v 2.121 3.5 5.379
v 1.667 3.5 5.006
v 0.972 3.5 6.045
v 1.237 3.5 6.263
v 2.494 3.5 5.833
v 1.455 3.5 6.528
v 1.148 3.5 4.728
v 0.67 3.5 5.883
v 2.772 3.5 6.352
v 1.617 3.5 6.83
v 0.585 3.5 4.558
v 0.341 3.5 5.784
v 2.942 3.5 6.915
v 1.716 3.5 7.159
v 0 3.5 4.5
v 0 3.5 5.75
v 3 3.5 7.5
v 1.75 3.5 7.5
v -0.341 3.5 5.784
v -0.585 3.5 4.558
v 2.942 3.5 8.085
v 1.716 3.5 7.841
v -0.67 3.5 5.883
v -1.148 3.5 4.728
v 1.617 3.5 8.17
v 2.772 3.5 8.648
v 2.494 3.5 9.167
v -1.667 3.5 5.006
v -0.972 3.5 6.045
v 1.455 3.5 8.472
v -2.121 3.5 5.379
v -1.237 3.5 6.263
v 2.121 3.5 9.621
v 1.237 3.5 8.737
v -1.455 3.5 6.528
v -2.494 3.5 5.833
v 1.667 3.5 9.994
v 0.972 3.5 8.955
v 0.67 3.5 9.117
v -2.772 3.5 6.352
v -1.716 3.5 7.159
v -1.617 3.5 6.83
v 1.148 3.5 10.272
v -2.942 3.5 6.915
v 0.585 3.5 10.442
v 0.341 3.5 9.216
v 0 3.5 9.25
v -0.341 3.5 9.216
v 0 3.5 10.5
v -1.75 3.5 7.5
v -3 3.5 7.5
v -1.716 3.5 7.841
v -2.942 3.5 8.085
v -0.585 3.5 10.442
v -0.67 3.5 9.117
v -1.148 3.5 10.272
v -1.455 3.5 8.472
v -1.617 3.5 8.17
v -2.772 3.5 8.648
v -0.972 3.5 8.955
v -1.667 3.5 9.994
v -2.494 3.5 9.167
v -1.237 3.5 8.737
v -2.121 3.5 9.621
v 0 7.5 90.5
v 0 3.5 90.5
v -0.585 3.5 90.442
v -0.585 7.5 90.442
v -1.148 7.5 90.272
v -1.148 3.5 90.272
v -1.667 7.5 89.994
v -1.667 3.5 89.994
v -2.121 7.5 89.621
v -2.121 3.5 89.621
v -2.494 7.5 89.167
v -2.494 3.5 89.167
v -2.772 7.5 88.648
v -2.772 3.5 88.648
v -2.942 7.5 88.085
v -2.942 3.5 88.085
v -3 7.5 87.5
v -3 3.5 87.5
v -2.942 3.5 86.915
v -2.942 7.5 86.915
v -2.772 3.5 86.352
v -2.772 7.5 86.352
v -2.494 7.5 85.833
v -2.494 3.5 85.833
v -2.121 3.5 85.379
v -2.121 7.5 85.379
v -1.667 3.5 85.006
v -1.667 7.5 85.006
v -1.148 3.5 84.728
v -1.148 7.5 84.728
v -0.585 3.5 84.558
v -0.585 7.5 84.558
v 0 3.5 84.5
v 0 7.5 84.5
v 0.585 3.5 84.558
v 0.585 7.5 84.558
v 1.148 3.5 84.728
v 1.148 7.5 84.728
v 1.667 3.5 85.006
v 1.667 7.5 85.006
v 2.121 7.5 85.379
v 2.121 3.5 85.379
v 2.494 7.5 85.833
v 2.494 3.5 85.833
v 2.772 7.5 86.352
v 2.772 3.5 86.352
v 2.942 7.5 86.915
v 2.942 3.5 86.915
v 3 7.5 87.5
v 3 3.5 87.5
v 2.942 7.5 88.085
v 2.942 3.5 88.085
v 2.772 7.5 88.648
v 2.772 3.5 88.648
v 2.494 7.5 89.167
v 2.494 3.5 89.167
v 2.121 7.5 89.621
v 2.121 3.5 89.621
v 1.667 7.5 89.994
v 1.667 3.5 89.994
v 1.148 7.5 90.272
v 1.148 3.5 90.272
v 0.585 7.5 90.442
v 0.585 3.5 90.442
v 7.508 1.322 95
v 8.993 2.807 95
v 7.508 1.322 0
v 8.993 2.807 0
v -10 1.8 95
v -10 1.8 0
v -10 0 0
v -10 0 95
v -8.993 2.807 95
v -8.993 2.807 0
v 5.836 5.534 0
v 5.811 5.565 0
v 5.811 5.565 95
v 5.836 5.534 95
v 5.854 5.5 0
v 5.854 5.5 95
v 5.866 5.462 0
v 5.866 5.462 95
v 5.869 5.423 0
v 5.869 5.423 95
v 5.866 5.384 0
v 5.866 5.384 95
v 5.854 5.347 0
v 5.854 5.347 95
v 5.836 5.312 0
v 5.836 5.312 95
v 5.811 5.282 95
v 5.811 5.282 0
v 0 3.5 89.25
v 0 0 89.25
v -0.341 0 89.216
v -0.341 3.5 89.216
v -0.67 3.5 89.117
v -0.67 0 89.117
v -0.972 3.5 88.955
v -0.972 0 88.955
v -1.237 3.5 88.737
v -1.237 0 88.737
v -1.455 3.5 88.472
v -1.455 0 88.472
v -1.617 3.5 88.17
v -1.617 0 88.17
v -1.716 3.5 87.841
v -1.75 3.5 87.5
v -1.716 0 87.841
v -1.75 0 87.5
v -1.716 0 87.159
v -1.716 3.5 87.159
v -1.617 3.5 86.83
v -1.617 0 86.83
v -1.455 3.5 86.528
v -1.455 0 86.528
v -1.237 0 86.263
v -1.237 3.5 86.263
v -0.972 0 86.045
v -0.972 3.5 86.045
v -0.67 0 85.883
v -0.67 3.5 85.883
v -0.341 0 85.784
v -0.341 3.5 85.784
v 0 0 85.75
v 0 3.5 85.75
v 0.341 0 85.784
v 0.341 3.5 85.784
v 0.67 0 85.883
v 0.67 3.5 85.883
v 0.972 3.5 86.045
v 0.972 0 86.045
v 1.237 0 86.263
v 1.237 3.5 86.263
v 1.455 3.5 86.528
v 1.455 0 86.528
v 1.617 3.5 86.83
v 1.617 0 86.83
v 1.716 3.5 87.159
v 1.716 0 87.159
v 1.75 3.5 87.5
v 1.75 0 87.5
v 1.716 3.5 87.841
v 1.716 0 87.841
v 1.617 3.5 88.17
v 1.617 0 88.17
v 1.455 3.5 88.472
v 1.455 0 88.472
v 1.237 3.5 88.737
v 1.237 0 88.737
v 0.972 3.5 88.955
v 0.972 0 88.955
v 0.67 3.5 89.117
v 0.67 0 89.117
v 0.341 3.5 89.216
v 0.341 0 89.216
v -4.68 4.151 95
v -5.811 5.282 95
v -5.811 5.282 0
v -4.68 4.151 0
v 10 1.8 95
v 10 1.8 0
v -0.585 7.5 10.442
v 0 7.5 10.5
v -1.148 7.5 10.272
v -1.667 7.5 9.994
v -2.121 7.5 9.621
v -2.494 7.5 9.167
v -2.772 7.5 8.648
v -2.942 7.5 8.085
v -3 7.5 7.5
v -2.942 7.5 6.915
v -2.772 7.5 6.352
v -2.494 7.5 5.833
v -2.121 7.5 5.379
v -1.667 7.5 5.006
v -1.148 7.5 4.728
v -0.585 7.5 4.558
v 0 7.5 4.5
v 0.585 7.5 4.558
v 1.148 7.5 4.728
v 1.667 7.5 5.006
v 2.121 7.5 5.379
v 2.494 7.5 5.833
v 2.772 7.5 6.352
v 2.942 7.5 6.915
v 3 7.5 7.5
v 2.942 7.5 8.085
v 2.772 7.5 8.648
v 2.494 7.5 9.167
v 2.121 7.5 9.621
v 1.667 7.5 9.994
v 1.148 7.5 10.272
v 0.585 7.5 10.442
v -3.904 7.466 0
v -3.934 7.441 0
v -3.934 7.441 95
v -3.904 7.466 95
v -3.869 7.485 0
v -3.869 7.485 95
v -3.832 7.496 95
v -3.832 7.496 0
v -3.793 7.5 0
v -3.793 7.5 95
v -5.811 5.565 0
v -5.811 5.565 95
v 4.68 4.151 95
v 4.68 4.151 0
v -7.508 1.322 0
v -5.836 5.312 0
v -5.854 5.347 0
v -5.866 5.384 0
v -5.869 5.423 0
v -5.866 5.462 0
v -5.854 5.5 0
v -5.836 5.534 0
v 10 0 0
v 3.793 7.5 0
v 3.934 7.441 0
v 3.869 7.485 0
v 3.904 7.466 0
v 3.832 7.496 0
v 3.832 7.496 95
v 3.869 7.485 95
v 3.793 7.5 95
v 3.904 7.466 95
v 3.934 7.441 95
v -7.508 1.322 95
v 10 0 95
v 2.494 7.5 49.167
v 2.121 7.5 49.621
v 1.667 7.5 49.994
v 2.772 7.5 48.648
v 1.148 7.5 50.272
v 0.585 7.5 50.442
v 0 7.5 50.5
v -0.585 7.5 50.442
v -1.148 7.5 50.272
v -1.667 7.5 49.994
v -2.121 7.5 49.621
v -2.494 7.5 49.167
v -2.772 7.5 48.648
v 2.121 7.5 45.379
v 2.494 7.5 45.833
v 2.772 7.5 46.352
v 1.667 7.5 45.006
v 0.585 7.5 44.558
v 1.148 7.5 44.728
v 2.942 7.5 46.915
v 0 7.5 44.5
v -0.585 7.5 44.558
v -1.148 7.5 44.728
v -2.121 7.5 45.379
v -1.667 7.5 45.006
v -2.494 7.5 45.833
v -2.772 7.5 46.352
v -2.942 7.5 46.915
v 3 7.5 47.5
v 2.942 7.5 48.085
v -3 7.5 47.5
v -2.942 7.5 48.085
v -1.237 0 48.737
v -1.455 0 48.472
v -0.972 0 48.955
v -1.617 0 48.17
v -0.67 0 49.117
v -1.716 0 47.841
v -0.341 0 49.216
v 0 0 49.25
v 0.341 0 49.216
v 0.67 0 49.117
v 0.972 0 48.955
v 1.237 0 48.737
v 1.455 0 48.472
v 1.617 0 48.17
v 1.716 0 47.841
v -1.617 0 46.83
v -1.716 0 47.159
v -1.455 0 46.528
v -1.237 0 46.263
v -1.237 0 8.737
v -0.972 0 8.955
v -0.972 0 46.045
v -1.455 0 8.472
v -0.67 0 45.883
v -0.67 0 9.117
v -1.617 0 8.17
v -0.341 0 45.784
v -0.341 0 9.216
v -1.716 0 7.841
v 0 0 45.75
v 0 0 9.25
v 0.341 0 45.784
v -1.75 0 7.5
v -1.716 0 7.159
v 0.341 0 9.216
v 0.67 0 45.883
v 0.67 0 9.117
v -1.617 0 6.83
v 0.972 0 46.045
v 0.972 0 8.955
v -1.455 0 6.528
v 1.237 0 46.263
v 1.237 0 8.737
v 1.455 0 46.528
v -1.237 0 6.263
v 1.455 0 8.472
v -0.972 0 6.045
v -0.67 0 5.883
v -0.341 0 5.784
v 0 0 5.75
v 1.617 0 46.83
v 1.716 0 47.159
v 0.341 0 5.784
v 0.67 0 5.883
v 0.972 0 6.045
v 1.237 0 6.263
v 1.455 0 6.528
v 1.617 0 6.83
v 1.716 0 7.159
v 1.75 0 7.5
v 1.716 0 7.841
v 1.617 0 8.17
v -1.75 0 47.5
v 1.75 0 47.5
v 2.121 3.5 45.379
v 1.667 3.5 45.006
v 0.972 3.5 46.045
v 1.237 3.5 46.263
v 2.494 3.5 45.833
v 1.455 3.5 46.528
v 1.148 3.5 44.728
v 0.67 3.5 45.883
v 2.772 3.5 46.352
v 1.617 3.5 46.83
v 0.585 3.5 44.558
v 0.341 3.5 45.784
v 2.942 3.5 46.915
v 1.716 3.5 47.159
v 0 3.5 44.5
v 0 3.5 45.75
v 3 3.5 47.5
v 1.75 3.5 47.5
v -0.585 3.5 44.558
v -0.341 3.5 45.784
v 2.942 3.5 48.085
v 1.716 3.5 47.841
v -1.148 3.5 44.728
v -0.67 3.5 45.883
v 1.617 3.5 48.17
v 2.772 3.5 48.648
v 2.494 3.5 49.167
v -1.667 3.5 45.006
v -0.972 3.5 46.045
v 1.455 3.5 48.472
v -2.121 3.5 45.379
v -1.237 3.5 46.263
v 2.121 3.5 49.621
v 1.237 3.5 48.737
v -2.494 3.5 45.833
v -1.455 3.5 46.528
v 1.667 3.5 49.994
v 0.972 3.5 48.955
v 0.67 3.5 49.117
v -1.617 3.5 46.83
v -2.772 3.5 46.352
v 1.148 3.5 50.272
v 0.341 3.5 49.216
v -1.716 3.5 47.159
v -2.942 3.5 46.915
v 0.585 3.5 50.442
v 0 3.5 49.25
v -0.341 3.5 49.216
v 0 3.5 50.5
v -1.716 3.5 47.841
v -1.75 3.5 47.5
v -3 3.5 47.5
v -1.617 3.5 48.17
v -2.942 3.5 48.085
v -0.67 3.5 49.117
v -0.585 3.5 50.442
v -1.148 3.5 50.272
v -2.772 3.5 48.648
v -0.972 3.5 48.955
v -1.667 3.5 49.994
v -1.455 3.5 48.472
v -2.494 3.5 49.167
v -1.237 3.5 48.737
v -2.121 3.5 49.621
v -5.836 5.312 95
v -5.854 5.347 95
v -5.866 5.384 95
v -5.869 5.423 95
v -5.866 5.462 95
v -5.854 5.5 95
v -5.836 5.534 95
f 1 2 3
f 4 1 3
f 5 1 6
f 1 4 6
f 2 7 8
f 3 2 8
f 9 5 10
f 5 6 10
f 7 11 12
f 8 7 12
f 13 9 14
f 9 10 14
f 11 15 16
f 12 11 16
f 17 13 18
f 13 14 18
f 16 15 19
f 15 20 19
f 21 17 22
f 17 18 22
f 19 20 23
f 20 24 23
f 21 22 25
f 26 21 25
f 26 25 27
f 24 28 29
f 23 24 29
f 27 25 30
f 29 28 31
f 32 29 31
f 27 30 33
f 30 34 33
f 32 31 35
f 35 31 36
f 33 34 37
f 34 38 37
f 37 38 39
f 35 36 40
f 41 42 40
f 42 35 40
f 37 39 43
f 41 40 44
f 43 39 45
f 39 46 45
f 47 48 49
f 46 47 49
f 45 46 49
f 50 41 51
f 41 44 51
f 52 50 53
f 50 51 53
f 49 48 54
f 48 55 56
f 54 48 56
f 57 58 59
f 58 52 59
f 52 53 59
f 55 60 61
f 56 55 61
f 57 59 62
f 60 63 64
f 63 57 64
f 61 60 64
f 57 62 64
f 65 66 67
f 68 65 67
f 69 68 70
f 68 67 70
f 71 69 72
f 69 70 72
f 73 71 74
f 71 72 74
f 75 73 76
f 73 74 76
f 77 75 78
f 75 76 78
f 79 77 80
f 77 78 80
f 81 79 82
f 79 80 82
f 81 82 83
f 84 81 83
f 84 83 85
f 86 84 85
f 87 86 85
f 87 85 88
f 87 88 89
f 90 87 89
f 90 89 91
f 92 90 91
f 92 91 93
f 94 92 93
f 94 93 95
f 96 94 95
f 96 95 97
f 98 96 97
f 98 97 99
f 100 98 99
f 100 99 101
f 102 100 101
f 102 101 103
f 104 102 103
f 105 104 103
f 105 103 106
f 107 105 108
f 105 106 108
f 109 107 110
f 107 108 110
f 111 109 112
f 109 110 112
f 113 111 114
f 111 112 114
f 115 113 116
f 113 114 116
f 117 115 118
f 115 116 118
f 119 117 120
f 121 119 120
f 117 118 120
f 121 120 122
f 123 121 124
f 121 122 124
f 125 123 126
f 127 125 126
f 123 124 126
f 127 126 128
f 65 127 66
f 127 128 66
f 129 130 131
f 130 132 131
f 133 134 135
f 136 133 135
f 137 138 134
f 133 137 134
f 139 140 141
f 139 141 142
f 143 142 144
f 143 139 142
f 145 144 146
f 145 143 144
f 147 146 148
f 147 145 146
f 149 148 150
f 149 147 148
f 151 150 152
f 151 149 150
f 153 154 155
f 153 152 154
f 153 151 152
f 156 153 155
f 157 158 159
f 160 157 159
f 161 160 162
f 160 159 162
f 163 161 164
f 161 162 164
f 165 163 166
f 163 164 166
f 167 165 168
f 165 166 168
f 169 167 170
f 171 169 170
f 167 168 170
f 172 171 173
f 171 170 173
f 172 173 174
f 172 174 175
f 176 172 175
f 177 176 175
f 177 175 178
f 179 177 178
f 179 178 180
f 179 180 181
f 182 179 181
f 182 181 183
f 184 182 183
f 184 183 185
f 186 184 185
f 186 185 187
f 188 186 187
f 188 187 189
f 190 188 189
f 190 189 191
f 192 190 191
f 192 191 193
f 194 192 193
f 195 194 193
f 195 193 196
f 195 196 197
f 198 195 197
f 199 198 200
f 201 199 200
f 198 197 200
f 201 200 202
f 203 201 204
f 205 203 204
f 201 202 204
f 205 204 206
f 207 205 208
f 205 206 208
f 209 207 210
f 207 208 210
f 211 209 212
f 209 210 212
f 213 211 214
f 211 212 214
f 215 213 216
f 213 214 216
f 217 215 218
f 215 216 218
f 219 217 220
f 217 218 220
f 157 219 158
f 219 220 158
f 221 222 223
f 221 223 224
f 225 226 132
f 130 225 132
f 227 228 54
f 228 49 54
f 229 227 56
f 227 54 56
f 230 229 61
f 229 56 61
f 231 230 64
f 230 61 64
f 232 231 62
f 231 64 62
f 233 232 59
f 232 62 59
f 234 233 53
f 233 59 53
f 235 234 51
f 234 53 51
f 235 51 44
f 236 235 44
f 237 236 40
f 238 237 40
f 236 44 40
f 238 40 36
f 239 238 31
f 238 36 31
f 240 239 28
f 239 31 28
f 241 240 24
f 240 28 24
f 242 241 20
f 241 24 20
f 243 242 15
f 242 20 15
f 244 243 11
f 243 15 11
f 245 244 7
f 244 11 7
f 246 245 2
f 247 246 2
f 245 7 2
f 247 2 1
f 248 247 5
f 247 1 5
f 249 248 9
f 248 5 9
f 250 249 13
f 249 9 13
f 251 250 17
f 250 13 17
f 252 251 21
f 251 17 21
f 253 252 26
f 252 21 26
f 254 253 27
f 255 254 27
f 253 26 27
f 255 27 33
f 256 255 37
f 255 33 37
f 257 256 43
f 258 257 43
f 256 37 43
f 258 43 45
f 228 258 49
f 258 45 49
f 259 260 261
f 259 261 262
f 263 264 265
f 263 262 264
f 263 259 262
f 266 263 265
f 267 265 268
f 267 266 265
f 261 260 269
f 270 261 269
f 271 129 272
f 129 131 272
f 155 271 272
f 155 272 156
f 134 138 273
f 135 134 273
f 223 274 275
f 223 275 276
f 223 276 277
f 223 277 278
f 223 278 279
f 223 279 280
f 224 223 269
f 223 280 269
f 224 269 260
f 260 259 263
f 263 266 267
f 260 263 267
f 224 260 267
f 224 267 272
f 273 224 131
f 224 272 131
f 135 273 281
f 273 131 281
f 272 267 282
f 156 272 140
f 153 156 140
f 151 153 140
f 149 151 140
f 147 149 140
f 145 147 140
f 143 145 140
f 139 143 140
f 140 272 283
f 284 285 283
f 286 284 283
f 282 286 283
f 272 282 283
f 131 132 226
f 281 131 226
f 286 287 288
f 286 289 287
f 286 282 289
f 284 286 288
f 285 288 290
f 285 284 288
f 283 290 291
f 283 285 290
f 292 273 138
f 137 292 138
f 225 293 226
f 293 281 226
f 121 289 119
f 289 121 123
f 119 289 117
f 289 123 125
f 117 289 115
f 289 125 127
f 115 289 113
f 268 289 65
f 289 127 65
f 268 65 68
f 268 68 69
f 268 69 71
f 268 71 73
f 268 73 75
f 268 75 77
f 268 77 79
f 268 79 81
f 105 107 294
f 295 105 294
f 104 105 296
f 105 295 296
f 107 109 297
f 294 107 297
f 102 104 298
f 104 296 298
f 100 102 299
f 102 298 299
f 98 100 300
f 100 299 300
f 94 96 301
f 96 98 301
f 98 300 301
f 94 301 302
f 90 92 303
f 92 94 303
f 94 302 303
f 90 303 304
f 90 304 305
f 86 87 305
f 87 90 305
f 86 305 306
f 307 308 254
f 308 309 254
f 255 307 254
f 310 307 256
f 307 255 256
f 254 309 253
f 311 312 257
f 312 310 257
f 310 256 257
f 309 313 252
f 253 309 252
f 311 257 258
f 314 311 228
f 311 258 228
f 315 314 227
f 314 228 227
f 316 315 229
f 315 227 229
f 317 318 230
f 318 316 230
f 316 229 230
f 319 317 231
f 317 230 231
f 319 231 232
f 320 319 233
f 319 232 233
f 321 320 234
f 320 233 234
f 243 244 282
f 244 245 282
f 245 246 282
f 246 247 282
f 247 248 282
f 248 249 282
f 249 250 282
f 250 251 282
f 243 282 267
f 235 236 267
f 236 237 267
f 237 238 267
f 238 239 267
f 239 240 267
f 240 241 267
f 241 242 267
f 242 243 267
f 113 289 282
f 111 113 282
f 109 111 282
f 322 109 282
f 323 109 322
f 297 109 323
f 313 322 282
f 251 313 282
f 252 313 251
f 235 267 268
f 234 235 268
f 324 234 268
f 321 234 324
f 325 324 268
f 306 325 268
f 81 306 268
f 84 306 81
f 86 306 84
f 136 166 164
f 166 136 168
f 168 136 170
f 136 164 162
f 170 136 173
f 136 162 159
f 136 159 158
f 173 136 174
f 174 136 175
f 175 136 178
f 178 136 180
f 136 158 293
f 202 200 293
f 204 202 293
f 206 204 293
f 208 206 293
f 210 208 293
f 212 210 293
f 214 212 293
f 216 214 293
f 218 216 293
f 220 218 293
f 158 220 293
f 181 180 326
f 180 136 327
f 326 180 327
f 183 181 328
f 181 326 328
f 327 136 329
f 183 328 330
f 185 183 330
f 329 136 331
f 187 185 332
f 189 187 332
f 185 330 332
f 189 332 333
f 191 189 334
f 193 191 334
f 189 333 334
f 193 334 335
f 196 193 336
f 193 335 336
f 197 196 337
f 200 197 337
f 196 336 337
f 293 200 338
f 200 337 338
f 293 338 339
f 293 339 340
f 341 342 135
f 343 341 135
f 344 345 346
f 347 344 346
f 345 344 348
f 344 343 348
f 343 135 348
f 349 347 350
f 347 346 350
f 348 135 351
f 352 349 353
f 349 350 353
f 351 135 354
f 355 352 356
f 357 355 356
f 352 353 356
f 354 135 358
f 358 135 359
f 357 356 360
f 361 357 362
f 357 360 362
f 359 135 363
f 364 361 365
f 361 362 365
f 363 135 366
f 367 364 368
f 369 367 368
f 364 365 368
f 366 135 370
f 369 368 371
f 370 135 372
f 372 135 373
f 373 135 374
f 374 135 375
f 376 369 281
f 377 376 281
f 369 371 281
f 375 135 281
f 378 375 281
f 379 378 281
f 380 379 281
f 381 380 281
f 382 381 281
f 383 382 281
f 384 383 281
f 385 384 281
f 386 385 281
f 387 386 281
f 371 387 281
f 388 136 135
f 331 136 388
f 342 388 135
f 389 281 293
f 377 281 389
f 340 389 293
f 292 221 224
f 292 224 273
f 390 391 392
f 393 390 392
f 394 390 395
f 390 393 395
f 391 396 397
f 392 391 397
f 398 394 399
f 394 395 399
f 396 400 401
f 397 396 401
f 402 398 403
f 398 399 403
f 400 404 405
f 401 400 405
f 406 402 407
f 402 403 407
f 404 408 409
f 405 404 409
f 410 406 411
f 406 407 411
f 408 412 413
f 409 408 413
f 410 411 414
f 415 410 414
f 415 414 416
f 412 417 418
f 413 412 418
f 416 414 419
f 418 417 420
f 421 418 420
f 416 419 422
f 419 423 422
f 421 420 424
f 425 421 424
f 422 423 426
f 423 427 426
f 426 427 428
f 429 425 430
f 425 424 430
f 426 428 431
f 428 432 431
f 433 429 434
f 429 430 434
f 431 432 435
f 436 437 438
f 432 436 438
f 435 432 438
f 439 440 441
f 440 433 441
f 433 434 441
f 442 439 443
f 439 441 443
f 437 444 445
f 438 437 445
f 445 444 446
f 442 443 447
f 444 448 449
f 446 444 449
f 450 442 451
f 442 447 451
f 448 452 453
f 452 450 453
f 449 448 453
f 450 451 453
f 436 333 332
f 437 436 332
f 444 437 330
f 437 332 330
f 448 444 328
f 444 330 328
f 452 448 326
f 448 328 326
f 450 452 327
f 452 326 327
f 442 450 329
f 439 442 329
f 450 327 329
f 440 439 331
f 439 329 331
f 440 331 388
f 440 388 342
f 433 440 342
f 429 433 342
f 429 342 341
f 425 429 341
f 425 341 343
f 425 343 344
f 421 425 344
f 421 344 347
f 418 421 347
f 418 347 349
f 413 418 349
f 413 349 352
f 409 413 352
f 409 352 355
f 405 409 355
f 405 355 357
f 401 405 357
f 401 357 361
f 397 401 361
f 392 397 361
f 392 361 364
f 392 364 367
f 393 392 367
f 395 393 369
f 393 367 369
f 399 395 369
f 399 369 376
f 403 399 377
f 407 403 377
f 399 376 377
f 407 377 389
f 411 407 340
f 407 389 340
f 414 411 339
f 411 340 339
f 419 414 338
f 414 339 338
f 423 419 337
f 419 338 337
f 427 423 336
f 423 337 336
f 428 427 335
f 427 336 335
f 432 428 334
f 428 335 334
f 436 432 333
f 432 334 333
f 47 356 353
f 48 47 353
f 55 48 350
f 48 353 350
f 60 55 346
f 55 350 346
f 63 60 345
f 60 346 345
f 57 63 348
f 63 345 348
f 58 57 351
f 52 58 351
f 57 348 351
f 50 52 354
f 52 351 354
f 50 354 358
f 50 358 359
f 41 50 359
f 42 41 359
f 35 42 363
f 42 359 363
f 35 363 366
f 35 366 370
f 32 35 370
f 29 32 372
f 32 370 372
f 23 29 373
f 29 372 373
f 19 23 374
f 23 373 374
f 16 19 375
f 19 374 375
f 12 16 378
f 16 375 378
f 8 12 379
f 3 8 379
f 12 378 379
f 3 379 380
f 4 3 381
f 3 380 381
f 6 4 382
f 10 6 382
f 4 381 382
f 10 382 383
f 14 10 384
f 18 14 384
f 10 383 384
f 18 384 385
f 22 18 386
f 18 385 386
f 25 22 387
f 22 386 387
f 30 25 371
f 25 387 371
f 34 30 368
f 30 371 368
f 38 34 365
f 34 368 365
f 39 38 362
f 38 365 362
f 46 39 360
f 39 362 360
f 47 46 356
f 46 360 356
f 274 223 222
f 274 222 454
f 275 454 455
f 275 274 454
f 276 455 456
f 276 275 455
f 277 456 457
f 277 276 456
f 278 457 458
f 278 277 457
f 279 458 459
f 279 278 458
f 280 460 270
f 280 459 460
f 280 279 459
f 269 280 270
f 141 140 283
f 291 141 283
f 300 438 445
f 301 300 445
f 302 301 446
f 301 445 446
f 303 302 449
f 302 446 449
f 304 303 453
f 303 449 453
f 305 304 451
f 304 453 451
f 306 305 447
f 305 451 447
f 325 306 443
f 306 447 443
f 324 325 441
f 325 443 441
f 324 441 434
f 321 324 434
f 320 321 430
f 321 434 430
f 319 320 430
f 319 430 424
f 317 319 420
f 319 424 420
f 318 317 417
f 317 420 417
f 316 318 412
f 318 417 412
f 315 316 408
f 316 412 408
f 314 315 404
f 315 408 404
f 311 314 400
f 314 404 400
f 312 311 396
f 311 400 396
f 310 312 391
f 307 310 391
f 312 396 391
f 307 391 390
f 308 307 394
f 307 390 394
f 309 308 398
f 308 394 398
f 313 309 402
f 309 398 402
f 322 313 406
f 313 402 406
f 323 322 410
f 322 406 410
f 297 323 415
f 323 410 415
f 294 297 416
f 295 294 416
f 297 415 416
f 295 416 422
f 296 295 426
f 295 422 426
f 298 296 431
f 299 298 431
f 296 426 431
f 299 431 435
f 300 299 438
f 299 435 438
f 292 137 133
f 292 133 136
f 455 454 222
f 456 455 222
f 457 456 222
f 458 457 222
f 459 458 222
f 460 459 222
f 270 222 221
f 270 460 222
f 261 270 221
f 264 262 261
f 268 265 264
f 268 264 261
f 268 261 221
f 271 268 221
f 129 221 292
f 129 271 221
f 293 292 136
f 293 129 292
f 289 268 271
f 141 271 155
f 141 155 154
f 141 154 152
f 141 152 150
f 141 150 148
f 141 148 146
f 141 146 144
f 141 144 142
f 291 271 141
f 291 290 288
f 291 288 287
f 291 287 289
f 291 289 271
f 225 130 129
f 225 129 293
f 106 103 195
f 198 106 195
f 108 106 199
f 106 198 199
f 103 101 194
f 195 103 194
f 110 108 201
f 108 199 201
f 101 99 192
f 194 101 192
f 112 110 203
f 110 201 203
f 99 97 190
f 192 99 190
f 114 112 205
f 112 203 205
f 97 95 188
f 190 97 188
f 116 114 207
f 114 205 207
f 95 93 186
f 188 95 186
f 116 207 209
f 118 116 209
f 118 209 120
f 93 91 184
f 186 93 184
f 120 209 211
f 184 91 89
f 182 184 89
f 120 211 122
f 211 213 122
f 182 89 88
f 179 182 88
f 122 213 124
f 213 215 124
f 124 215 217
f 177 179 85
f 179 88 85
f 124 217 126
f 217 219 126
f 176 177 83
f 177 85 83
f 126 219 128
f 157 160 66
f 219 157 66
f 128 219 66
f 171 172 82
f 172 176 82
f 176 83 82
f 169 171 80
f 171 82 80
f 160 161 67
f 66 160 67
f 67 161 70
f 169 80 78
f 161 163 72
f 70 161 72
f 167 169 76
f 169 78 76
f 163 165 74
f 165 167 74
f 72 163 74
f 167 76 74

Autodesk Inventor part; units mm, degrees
sketch "_____2" plane through (0, 0, 0) normal (0, 0, 1) x (1, 0, 0)
  line L0 (-10, 1.8) -> (-10, 0)
  line L1 (-10, 0) -> (10, 0)
  line L2 (10, 0) -> (10, 1.8)
  line L3 (10, 1.8) -> (8.9929, 2.8071)
  line L4 (8.9929, 2.8071) -> (7.508, 1.3222)
  line L5 (7.508, 1.3222) -> (4.6795, 4.1506)
  line L6 (4.6795, 4.1506) -> (5.8109, 5.282)
  arc A0 (5.8109, 5.282) -> (5.8109, 5.5648) centre (5.6695, 5.4234) ccw
  line L7 (5.8109, 5.5648) -> (3.9343, 7.4414)
  arc A1 (3.9343, 7.4414) -> (3.7929, 7.5) centre (3.7929, 7.3) ccw
  line L8 (3.7929, 7.5) -> (-3.7929, 7.5)
  arc A2 (-3.7929, 7.5) -> (-3.9343, 7.4414) centre (-3.7929, 7.3) ccw
  line L9 (-3.9343, 7.4414) -> (-5.8109, 5.5648)
  arc A3 (-5.8109, 5.5648) -> (-5.8109, 5.282) centre (-5.6695, 5.4234) ccw
  line L10 (-5.8109, 5.282) -> (-4.6795, 4.1506)
  line L11 (-4.6795, 4.1506) -> (-7.508, 1.3222)
  line L12 (-7.508, 1.3222) -> (-8.9929, 2.8071)
  line L13 (-8.9929, 2.8071) -> (-10, 1.8)
extrude "Extrusion1" add sketch "_____2" along normal blind 95
sketch "Sketch2" plane through (-3.7929, 7.5, 0) normal (0, 1, 0) x (1, 0, 0)
  point P0 (3.7929, -7.5)
hole "Hole1" at (0, 7.5, 7.5) direction (0, -1, 0) diameter 3.5 depth 7.5 counterbore diameter 6 counterbore depth 4
pattern_linear "Rectangular Pattern1" count 3 spacing 40 along (0, 0, 1) of "Hole1"
ref_plane "to_block_XY" through (0, 0, 47.5) normal (0, 0, 1) x (1, 0, 0)
ref_plane "to_block_YZ" through (0, 0, 47.5) normal (1, 0, 0) x (0, 1, 0)
ref_plane "to_block_ZX" through (0, 0, 47.5) normal (0, 1, 0) x (0, 0, 1)
ref_plane "to_block2_XY" through (0, 0, 47.5) normal (0, 0, 1) x (1, 0, 0)
ref_plane "to_block2_YZ" through (0, 0, 47.5) normal (1, 0, 0) x (0, 1, 0)
ref_plane "to_block2_ZX" through (0, 0, 47.5) normal (0, 1, 0) x (0, 0, 1)
properties part number "JKSGR10-95"
